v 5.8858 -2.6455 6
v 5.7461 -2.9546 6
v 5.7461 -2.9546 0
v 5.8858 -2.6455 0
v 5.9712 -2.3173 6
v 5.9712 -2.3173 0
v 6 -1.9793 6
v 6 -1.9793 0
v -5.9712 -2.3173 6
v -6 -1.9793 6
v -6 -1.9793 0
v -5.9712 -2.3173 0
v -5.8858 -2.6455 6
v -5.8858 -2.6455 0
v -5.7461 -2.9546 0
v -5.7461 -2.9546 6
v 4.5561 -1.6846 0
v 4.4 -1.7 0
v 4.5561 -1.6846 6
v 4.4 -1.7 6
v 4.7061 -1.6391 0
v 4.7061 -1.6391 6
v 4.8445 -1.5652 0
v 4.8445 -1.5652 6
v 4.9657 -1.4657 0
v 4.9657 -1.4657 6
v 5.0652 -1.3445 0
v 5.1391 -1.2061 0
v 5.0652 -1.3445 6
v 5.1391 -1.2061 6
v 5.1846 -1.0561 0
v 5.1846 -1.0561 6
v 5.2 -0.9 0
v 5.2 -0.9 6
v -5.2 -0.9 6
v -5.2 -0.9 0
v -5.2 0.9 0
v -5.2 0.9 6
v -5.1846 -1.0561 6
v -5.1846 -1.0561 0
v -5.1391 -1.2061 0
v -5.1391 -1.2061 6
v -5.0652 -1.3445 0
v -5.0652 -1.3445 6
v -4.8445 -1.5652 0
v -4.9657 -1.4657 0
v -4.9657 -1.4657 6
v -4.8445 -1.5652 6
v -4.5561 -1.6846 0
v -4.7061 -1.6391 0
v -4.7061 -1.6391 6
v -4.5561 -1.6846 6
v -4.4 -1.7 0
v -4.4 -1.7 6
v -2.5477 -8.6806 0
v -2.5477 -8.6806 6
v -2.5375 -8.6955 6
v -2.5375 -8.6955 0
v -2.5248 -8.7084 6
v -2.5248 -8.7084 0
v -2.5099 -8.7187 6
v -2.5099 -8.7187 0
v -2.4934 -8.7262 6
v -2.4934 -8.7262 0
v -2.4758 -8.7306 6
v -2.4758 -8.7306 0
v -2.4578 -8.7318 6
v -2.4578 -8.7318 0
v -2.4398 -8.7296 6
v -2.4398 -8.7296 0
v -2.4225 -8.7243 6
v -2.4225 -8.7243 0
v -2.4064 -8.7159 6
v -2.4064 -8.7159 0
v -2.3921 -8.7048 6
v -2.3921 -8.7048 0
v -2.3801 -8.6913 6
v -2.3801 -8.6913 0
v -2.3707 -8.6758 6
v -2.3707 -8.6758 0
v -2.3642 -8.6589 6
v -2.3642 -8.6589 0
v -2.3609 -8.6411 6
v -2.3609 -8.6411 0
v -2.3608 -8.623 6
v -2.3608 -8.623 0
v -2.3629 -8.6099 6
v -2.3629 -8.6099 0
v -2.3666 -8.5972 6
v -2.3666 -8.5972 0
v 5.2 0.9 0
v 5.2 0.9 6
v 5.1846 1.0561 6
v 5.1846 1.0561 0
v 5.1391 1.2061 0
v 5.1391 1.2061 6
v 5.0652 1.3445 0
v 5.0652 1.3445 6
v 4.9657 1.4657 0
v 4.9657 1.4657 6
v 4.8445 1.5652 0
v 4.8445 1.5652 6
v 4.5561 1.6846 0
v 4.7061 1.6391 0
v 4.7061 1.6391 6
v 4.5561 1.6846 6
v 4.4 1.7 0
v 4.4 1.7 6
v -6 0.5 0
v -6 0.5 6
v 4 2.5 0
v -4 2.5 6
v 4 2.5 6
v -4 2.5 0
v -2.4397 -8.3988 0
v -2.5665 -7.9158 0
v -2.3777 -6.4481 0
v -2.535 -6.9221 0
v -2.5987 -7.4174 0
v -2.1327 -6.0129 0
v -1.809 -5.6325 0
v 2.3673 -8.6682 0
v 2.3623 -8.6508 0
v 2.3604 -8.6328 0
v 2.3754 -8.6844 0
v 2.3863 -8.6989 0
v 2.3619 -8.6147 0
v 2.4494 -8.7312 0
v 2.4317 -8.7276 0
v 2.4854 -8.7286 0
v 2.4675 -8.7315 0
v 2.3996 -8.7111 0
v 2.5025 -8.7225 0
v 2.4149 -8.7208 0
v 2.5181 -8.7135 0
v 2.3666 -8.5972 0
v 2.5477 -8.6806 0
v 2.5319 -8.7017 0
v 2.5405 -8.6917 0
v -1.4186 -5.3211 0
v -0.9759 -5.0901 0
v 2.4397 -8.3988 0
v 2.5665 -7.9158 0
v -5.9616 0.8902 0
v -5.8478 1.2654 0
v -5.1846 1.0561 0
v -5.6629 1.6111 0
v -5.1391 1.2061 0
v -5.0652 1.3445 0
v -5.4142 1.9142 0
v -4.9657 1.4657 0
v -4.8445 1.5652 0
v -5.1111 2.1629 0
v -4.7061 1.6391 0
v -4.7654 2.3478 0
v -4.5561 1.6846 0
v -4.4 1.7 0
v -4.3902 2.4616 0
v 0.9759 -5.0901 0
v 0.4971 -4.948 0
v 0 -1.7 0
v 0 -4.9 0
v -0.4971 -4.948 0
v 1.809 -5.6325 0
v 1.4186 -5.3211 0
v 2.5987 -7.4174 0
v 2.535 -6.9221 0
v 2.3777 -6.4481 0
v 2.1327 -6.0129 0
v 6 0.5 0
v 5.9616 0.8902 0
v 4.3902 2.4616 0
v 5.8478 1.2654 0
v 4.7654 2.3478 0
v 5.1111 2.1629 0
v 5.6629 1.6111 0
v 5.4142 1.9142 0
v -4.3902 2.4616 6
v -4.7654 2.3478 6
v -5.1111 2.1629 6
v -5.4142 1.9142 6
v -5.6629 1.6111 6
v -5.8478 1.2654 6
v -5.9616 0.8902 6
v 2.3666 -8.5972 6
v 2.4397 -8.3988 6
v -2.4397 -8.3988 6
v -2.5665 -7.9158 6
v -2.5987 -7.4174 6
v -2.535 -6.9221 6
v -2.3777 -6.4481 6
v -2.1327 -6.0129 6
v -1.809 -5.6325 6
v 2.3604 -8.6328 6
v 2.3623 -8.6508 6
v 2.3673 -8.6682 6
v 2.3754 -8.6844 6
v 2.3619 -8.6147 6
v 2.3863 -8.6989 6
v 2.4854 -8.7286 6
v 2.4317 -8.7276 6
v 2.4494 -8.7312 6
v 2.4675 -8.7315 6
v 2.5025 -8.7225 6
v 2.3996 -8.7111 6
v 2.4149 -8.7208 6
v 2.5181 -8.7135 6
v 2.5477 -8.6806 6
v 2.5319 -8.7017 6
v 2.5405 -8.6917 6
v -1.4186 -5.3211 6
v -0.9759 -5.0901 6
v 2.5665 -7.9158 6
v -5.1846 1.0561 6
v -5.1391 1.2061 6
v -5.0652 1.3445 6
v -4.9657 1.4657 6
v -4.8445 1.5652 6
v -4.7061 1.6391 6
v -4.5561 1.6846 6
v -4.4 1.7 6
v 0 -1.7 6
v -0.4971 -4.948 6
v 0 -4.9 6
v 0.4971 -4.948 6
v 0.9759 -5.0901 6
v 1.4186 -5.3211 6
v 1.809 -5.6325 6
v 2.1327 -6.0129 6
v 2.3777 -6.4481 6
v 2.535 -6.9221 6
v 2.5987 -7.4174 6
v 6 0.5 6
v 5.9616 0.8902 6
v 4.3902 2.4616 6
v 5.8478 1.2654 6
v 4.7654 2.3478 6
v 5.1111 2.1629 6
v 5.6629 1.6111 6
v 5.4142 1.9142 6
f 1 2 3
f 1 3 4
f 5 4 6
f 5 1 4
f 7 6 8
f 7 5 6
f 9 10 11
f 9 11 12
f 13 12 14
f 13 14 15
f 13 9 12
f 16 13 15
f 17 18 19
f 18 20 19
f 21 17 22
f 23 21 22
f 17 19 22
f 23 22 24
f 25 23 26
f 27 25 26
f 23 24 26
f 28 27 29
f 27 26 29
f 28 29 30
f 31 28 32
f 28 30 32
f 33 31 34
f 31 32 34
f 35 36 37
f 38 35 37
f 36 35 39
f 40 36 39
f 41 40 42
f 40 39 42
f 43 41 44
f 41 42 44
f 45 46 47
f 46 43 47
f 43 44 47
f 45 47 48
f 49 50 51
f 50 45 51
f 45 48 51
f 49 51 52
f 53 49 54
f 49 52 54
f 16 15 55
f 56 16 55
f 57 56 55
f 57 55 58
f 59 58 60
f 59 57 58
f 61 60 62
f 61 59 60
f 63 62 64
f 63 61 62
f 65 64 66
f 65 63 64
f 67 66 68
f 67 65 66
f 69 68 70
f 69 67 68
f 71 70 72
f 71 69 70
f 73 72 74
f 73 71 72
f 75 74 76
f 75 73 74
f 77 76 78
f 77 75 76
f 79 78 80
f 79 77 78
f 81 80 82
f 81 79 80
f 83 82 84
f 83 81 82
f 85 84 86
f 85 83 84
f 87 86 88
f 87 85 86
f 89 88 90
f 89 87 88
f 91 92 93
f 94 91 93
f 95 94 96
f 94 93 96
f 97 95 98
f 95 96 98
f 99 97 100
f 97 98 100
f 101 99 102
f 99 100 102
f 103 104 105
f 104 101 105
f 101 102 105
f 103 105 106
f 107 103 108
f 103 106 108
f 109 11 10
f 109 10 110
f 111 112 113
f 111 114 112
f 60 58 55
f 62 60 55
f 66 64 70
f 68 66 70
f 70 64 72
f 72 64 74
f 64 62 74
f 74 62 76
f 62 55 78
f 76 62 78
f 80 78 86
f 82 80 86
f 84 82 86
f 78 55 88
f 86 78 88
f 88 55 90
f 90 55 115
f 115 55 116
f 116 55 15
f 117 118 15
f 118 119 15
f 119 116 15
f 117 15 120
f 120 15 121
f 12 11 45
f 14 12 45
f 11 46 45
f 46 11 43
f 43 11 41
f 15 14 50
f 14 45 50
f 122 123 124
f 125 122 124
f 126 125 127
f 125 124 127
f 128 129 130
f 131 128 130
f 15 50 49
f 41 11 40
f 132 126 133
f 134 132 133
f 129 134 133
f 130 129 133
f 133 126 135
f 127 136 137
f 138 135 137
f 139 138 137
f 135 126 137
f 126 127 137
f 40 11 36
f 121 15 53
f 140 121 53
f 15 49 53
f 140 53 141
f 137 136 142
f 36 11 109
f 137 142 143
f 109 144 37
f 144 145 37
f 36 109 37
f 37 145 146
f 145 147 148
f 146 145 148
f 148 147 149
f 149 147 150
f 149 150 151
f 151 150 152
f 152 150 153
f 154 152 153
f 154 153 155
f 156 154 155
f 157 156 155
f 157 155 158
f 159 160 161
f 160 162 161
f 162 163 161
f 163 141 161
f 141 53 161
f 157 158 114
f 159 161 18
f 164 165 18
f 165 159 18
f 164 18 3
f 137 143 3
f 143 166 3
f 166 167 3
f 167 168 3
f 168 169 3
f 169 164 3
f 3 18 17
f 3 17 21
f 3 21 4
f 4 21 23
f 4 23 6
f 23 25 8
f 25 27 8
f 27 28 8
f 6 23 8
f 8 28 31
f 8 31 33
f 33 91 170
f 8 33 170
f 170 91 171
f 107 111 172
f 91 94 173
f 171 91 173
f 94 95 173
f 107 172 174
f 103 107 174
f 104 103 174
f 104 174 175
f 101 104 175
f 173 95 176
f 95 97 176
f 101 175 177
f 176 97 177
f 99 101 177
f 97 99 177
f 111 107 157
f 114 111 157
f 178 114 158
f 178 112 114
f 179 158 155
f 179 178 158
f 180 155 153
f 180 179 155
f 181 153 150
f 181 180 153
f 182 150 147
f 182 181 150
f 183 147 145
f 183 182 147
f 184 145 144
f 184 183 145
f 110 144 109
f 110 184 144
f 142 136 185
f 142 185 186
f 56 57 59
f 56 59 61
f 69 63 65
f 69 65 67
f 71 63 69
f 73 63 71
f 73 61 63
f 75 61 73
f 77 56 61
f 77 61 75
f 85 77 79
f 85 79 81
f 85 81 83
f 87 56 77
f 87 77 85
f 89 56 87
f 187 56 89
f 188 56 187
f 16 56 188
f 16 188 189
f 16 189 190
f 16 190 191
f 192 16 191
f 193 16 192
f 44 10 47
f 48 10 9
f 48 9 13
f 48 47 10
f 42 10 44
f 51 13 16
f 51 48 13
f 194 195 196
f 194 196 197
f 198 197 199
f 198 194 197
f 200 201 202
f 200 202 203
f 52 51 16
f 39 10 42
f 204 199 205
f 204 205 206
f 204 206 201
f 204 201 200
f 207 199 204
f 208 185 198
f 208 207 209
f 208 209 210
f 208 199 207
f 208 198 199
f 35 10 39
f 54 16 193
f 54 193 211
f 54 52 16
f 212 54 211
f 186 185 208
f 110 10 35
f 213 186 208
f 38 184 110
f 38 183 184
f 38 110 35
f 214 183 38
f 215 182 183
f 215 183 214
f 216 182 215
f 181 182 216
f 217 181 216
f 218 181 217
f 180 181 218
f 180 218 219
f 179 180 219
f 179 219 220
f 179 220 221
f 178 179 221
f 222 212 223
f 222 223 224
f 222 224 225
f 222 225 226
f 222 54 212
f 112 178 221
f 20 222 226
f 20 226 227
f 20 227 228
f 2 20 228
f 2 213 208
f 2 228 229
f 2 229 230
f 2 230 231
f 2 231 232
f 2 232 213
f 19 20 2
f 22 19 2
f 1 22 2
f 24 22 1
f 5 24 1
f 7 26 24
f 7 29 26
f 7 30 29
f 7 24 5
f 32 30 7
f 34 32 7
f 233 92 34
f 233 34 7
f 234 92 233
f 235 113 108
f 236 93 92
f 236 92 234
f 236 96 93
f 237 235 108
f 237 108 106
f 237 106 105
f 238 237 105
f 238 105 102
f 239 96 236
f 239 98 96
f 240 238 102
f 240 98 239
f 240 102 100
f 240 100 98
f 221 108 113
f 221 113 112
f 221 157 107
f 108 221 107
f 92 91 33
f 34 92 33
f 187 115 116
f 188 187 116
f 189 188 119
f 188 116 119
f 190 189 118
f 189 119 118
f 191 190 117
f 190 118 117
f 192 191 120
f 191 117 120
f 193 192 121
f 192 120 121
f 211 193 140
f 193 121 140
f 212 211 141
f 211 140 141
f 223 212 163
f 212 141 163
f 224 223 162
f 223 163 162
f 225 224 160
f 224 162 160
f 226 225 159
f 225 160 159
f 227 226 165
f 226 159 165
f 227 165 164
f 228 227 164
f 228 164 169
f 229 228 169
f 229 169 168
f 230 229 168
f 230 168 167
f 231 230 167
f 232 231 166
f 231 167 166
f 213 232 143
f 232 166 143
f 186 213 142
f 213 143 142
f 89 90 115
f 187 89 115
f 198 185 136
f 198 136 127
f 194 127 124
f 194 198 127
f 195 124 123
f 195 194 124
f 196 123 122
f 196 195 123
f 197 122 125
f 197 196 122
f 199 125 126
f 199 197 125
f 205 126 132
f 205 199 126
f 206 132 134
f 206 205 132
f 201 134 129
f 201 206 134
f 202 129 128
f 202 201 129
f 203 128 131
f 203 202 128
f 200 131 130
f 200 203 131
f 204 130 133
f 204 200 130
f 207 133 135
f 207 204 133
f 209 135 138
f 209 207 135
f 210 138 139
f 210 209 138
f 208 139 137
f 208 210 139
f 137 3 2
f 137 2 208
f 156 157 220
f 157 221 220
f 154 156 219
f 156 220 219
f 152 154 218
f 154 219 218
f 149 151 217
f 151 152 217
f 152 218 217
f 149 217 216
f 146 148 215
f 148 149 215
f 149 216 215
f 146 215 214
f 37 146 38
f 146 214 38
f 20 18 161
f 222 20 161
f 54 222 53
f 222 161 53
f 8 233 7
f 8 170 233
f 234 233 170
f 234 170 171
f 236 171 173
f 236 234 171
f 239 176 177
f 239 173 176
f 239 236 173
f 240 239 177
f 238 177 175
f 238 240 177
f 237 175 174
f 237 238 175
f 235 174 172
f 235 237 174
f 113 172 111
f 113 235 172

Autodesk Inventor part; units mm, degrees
ref_plane "YZ Plane" through (0, 0, 0) normal (1, 0, 0) x (0, 1, 0)
ref_plane "XZ Plane" through (0, 0, 0) normal (0, 1, 0) x (-1, 0, 0)
ref_plane "XY Plane" through (0, 0, 0) normal (0, 0, 1) x (1, 0, 0)
sketch "Sketch1" plane through (0, 0, 0) normal (0, 0, 1) x (1, 0, 0)
  line L0 (-5.2, 1.7) -> (5.2, 1.7)
  line L1 (5.2, 1.7) -> (5.2, -1.7)
  line L2 (5.2, -1.7) -> (-5.2, -1.7)
  line L3 (-5.2, -1.7) -> (-5.2, 1.7)
  line L4 (-5.2, 1.7) -> (5.2, -1.7) construction
  line L5 (5.2, 1.7) -> (-5.2, -1.7) construction
  line L6 (0, 0) -> (0, -7.5)
  circle A0 centre (0, -7.5) radius 2.6
  line L7 (-6, 2.5) -> (6, 2.5)
  line L8 (6, 2.5) -> (6, -2.5)
  line L9 (6, -2.5) -> (-6, -2.5)
  line L10 (-6, -2.5) -> (-6, 2.5)
  line L11 (-6, 2.5) -> (6, -2.5) construction
  line L12 (6, 2.5) -> (-6, -2.5) construction
  circle A1 centre (0, -7.5) radius 2.8
  line L13 (-6, -2.5) -> (-2.4445, -8.8654)
  line L14 (6, -2.5) -> (2.4445, -8.8654)
  line L15 (0, -7.5) -> (2.1964, -10.1176)
  line L16 (0, -7.5) -> (3.417, -7.5) construction
  line L17 (0, -7.5) -> (-2.5132, -10.4951)
  line L18 (0, -7.5) -> (3.9099, -7.5) construction
  line L19 (2.4445, -8.8654) -> (1.9255, -9.7947)
  line L20 (-2.4445, -8.8654) -> (-1.9255, -9.7947)
  line L21 (-1.9255, -9.7947) -> (-2.4397, -8.3988)
  line L22 (1.9255, -9.7947) -> (2.4397, -8.3988)
  point P0 (-2.2345, -8.8294)
  point P1 (2.2345, -8.8294)
  point P2 (-2.5783, -7.8348)
  point P3 (2.5783, -7.8348)
  dimension "d0" = 10.4
  dimension "d1" = 3.4
  dimension "d2" = 7.5
  dimension "d3" = 5.2
  dimension "d4" = 12
  dimension "d5" = 5
  dimension "d9" = 5.6
  dimension "d10" = 50
  dimension "d11" = 130
extrude "Extrusion1" add sketch "Sketch1" along normal blind 6 contours L9 L10 L7 L8 | L9 L14 A1 L6 | L6 A1 L13 L9 | A1 L22 A0 L6 | L6 A0 L21 A1 | A1 L21 L20 | L19 L22 A1
fillet "Fillet1" radius 2 4 edges at (-6, 2.5, 3) (6, 2.5, 3) (-6, -2.5, 3) (6, -2.5, 3)
fillet "Fillet2" radius 0.1 2 edges at (-1.9255, -9.7947, 3) (1.9255, -9.7947, 3)
fillet "Fillet3" radius 0.8 4 edges at (5.2, -1.7, 3) (5.2, 1.7, 3) (-5.2, -1.7, 3) (-5.2, 1.7, 3)
properties part number "Turret_Holder_2_test_pt2"
